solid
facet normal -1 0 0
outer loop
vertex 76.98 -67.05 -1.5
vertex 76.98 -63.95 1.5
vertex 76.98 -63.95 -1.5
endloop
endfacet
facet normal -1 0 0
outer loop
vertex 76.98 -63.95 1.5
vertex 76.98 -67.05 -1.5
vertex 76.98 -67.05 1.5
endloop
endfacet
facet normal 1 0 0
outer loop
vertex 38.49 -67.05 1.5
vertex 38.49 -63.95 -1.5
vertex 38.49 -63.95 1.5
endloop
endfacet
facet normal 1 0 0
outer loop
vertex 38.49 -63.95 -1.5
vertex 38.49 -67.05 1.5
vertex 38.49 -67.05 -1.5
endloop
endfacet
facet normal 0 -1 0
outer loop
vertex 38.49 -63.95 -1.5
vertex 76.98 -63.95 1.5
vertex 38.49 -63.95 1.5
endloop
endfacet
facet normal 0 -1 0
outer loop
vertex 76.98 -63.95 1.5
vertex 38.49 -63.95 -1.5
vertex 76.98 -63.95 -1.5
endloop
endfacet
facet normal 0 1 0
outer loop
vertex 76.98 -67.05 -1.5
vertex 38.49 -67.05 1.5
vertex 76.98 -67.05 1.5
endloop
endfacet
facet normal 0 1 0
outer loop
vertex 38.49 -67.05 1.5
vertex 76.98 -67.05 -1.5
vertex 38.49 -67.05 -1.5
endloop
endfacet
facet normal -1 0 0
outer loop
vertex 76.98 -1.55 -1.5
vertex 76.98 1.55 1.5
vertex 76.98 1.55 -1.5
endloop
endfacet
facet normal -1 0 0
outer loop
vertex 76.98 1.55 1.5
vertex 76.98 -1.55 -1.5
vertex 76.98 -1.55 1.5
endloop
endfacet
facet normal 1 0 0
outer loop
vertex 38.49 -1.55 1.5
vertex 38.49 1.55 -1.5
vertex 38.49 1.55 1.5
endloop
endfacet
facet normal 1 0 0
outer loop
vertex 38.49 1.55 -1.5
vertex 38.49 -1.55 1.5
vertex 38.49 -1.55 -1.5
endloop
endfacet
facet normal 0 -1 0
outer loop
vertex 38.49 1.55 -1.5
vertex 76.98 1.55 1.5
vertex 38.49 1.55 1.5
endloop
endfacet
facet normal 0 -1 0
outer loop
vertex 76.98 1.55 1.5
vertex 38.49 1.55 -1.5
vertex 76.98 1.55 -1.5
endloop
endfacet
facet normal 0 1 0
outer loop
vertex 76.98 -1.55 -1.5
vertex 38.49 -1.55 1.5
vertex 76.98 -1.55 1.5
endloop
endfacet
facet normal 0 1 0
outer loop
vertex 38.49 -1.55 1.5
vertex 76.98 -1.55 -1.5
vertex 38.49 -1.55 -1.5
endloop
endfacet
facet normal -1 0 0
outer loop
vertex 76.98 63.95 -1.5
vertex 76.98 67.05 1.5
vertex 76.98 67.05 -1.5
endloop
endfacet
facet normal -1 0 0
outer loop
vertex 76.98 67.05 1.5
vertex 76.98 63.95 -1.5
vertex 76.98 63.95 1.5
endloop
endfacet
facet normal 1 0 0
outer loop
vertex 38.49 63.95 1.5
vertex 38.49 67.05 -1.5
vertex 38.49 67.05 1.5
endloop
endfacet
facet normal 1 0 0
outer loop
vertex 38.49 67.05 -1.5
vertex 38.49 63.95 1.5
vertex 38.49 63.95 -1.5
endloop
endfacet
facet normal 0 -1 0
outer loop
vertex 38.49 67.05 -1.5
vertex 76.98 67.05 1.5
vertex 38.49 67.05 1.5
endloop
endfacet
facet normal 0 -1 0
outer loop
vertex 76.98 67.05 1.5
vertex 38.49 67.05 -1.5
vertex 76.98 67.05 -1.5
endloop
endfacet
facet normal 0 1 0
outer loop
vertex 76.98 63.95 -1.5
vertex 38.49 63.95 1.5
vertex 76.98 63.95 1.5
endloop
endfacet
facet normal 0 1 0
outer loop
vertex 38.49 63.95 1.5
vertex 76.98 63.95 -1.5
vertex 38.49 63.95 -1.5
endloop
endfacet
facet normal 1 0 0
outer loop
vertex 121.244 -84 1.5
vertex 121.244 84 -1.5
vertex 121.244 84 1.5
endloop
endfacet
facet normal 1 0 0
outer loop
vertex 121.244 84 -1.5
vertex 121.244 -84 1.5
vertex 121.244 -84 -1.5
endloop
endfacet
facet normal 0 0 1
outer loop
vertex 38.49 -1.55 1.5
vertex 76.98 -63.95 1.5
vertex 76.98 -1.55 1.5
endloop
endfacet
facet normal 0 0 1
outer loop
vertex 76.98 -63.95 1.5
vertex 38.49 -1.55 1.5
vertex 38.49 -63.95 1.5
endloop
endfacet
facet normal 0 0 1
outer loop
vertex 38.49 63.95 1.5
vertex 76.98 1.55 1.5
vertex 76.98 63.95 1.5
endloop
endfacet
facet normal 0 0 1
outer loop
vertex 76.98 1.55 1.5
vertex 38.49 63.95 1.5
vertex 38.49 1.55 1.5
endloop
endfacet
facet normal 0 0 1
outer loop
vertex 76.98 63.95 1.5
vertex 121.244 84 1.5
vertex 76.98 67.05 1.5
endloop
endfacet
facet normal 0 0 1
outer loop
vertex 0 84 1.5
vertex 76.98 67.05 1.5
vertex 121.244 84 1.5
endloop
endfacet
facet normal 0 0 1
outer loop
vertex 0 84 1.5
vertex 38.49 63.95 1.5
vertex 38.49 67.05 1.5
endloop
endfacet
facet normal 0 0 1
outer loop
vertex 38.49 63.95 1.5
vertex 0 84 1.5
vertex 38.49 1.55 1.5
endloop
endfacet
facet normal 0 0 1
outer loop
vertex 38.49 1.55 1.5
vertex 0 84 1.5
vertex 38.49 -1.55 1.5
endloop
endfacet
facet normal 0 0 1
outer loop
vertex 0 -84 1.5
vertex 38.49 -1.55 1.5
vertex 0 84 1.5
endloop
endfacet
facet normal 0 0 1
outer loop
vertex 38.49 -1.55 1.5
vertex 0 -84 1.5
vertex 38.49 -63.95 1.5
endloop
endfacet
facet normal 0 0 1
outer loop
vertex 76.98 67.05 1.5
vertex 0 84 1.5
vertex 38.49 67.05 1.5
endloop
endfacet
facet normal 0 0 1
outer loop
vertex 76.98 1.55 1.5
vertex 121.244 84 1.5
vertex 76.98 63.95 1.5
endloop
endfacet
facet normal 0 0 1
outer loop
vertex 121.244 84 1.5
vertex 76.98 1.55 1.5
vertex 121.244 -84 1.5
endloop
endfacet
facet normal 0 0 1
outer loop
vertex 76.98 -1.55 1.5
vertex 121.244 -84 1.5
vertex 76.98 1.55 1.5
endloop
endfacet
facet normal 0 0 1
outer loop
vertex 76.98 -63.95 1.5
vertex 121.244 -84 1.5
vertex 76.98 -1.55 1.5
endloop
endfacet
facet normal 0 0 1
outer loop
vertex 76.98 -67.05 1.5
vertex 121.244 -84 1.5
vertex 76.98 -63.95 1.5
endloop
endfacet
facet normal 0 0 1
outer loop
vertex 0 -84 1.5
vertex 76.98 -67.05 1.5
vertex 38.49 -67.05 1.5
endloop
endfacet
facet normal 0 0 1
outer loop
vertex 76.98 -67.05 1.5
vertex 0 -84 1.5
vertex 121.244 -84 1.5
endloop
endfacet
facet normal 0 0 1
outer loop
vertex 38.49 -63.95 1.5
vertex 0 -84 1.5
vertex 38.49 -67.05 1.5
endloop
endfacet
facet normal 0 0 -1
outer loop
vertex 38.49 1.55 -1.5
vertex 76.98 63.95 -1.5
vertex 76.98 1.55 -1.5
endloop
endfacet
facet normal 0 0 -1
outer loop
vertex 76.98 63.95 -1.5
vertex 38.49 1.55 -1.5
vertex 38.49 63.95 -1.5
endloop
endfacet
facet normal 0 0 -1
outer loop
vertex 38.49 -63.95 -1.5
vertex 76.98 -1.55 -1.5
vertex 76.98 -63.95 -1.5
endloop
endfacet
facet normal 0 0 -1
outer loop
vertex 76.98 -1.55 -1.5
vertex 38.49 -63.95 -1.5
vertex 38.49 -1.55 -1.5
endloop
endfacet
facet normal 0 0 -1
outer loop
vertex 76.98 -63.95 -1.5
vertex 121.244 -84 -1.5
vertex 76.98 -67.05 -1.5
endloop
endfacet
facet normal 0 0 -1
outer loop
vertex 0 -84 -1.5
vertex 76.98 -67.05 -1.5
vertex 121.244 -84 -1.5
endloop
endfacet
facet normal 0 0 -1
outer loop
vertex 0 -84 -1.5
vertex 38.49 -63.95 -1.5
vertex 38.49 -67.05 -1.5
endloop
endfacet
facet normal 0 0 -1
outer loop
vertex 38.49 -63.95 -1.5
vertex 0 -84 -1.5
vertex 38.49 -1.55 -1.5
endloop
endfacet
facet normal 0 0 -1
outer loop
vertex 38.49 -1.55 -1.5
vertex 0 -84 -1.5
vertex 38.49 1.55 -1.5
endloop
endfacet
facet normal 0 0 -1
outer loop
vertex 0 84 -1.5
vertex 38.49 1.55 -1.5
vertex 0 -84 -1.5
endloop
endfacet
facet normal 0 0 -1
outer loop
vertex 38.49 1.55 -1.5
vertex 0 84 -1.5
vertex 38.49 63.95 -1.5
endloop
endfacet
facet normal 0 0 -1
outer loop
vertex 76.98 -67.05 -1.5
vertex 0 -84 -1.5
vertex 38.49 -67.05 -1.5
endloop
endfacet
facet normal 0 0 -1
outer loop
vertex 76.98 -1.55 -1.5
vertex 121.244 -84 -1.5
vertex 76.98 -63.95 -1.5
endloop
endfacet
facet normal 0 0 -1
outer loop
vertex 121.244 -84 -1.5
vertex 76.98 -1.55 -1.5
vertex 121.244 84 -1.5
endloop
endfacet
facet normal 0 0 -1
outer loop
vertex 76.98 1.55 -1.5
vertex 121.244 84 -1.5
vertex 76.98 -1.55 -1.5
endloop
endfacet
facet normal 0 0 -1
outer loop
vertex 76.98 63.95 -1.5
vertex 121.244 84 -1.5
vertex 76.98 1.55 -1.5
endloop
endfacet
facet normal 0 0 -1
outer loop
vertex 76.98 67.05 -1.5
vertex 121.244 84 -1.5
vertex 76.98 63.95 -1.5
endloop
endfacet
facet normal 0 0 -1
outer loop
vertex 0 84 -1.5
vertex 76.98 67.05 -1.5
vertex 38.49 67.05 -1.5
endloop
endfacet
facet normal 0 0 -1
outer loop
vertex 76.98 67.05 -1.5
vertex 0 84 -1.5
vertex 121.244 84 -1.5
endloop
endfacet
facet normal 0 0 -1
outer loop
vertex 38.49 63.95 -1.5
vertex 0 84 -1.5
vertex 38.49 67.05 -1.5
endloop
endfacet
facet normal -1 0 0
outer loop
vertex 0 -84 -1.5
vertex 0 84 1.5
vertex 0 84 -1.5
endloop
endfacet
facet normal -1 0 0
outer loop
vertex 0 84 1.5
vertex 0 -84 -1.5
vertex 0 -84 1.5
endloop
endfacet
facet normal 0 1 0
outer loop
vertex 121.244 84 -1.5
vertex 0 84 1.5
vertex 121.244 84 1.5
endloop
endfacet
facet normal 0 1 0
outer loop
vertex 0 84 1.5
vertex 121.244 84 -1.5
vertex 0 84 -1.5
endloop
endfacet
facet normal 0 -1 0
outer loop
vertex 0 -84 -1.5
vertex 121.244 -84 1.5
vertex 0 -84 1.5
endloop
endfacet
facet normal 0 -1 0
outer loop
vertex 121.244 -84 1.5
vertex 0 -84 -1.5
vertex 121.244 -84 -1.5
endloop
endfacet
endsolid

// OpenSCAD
// file: measures.scad
/*
 * All measures of the model
 * Default units: Millimeters
 */

// rendering parameters
$fn = 50;

// material to cut from
material_x = 610;
material_y = 330;
material_z = 3;

// house cuboid
house_x = 200;
house_y = 140;
house_z = 60;

// make holes a little bigger than the corresponding noses
hole_expansion = 0.1;

// distances from left and bottom house edges
door_x = 35;
door_z = 35;
door_radius = 40/2;

window_offset_x = -21;
window_offset_z = 5;
window_triangle_count_x = 13;
window_triangle_count_y = 6;

wall_y = house_y * 1/2;
wall_z = house_z * 4/5;
wall_offset_x = -35;

// pattern on the hallway wall
wall_pattern_offset_y = -31;
wall_pattern_offset_z = -19;
wall_triangle_count_x = 8;
wall_triangle_count_y = 4;

// how many holes per edge
strap_hole_count = 1;
strap_hole_radius = 3;
strap_hole_spacing = house_y/(strap_hole_count+1);
strap_hole_to_edge = 7;

// angle between upper house cuboid edge and roof plane in degrees
roof_angle = 30;

// elevation inside roof corner above upper edge of house cuboid
roof_elevation = tan(roof_angle) * house_x/2;

roof_support_cutout_height = roof_elevation * 1/3;
roof_support_cutout_inset = house_x * 6/20;

// length of a roof plane from top corner to house cuboid corner
roof_hypothenuse = 1/cos(roof_angle) * house_x/2;

// make roof a little longer than required
roof_plane_x = roof_hypothenuse * 1.05;
roof_plane_y = house_y * 1.2;

/*
// M4
screw_radius = 4;
screw_length = 20;
washer_radius = 9;
nut_height = 3.2;
nut_wrench_size = 7;
nut_offset = 7;
*/

// M3
screw_radius = 3.005;
screw_length = 8;
washer_radius = 7;
nut_height = 2.4 -0.1;
nut_wrench_size = 5.5 -0.1;
nut_offset = material_z*1.5;
// main file
include <measures.scad>;

module roof_plane()
{
    difference()
    {
        translate([
            0,
            -roof_plane_y/2,
            -material_z/2
            ])
        cube([
            roof_plane_x,
            roof_plane_y,
            material_z
            ]);

        // cut holes for the roof support's nose
        for (y=[
            // where the supports will go, see roof.scad
            -house_y/2 + material_z*1.5,
            0,
            +house_y/2 - material_z*1.5
            ])
        {
            translate([
                roof_hypothenuse/2,
                y,
                0
                ])
            cube([
                roof_hypothenuse/3,
                material_z + hole_expansion,
                material_z*1.2
                ], center=true);
        }
    }
}

module roof_plane_right()
{
    // make it so, that the corner touches the y axis
    translate([
        sin(roof_angle)*material_z/2,
        0,
        cos(roof_angle)*material_z/2
        ])
    // tilt the roof
    rotate([
        0,
        roof_angle,
        0
        ])
    roof_plane();
}

module roof_plane_left()
{
    // just make a rotated version of the previous plane
    rotate([
        0,
        0,
        180
        ])
    roof_plane_right();
}

module roof_planes()
{
    roof_plane_left();
    roof_plane_right();
}

roof_plane();
